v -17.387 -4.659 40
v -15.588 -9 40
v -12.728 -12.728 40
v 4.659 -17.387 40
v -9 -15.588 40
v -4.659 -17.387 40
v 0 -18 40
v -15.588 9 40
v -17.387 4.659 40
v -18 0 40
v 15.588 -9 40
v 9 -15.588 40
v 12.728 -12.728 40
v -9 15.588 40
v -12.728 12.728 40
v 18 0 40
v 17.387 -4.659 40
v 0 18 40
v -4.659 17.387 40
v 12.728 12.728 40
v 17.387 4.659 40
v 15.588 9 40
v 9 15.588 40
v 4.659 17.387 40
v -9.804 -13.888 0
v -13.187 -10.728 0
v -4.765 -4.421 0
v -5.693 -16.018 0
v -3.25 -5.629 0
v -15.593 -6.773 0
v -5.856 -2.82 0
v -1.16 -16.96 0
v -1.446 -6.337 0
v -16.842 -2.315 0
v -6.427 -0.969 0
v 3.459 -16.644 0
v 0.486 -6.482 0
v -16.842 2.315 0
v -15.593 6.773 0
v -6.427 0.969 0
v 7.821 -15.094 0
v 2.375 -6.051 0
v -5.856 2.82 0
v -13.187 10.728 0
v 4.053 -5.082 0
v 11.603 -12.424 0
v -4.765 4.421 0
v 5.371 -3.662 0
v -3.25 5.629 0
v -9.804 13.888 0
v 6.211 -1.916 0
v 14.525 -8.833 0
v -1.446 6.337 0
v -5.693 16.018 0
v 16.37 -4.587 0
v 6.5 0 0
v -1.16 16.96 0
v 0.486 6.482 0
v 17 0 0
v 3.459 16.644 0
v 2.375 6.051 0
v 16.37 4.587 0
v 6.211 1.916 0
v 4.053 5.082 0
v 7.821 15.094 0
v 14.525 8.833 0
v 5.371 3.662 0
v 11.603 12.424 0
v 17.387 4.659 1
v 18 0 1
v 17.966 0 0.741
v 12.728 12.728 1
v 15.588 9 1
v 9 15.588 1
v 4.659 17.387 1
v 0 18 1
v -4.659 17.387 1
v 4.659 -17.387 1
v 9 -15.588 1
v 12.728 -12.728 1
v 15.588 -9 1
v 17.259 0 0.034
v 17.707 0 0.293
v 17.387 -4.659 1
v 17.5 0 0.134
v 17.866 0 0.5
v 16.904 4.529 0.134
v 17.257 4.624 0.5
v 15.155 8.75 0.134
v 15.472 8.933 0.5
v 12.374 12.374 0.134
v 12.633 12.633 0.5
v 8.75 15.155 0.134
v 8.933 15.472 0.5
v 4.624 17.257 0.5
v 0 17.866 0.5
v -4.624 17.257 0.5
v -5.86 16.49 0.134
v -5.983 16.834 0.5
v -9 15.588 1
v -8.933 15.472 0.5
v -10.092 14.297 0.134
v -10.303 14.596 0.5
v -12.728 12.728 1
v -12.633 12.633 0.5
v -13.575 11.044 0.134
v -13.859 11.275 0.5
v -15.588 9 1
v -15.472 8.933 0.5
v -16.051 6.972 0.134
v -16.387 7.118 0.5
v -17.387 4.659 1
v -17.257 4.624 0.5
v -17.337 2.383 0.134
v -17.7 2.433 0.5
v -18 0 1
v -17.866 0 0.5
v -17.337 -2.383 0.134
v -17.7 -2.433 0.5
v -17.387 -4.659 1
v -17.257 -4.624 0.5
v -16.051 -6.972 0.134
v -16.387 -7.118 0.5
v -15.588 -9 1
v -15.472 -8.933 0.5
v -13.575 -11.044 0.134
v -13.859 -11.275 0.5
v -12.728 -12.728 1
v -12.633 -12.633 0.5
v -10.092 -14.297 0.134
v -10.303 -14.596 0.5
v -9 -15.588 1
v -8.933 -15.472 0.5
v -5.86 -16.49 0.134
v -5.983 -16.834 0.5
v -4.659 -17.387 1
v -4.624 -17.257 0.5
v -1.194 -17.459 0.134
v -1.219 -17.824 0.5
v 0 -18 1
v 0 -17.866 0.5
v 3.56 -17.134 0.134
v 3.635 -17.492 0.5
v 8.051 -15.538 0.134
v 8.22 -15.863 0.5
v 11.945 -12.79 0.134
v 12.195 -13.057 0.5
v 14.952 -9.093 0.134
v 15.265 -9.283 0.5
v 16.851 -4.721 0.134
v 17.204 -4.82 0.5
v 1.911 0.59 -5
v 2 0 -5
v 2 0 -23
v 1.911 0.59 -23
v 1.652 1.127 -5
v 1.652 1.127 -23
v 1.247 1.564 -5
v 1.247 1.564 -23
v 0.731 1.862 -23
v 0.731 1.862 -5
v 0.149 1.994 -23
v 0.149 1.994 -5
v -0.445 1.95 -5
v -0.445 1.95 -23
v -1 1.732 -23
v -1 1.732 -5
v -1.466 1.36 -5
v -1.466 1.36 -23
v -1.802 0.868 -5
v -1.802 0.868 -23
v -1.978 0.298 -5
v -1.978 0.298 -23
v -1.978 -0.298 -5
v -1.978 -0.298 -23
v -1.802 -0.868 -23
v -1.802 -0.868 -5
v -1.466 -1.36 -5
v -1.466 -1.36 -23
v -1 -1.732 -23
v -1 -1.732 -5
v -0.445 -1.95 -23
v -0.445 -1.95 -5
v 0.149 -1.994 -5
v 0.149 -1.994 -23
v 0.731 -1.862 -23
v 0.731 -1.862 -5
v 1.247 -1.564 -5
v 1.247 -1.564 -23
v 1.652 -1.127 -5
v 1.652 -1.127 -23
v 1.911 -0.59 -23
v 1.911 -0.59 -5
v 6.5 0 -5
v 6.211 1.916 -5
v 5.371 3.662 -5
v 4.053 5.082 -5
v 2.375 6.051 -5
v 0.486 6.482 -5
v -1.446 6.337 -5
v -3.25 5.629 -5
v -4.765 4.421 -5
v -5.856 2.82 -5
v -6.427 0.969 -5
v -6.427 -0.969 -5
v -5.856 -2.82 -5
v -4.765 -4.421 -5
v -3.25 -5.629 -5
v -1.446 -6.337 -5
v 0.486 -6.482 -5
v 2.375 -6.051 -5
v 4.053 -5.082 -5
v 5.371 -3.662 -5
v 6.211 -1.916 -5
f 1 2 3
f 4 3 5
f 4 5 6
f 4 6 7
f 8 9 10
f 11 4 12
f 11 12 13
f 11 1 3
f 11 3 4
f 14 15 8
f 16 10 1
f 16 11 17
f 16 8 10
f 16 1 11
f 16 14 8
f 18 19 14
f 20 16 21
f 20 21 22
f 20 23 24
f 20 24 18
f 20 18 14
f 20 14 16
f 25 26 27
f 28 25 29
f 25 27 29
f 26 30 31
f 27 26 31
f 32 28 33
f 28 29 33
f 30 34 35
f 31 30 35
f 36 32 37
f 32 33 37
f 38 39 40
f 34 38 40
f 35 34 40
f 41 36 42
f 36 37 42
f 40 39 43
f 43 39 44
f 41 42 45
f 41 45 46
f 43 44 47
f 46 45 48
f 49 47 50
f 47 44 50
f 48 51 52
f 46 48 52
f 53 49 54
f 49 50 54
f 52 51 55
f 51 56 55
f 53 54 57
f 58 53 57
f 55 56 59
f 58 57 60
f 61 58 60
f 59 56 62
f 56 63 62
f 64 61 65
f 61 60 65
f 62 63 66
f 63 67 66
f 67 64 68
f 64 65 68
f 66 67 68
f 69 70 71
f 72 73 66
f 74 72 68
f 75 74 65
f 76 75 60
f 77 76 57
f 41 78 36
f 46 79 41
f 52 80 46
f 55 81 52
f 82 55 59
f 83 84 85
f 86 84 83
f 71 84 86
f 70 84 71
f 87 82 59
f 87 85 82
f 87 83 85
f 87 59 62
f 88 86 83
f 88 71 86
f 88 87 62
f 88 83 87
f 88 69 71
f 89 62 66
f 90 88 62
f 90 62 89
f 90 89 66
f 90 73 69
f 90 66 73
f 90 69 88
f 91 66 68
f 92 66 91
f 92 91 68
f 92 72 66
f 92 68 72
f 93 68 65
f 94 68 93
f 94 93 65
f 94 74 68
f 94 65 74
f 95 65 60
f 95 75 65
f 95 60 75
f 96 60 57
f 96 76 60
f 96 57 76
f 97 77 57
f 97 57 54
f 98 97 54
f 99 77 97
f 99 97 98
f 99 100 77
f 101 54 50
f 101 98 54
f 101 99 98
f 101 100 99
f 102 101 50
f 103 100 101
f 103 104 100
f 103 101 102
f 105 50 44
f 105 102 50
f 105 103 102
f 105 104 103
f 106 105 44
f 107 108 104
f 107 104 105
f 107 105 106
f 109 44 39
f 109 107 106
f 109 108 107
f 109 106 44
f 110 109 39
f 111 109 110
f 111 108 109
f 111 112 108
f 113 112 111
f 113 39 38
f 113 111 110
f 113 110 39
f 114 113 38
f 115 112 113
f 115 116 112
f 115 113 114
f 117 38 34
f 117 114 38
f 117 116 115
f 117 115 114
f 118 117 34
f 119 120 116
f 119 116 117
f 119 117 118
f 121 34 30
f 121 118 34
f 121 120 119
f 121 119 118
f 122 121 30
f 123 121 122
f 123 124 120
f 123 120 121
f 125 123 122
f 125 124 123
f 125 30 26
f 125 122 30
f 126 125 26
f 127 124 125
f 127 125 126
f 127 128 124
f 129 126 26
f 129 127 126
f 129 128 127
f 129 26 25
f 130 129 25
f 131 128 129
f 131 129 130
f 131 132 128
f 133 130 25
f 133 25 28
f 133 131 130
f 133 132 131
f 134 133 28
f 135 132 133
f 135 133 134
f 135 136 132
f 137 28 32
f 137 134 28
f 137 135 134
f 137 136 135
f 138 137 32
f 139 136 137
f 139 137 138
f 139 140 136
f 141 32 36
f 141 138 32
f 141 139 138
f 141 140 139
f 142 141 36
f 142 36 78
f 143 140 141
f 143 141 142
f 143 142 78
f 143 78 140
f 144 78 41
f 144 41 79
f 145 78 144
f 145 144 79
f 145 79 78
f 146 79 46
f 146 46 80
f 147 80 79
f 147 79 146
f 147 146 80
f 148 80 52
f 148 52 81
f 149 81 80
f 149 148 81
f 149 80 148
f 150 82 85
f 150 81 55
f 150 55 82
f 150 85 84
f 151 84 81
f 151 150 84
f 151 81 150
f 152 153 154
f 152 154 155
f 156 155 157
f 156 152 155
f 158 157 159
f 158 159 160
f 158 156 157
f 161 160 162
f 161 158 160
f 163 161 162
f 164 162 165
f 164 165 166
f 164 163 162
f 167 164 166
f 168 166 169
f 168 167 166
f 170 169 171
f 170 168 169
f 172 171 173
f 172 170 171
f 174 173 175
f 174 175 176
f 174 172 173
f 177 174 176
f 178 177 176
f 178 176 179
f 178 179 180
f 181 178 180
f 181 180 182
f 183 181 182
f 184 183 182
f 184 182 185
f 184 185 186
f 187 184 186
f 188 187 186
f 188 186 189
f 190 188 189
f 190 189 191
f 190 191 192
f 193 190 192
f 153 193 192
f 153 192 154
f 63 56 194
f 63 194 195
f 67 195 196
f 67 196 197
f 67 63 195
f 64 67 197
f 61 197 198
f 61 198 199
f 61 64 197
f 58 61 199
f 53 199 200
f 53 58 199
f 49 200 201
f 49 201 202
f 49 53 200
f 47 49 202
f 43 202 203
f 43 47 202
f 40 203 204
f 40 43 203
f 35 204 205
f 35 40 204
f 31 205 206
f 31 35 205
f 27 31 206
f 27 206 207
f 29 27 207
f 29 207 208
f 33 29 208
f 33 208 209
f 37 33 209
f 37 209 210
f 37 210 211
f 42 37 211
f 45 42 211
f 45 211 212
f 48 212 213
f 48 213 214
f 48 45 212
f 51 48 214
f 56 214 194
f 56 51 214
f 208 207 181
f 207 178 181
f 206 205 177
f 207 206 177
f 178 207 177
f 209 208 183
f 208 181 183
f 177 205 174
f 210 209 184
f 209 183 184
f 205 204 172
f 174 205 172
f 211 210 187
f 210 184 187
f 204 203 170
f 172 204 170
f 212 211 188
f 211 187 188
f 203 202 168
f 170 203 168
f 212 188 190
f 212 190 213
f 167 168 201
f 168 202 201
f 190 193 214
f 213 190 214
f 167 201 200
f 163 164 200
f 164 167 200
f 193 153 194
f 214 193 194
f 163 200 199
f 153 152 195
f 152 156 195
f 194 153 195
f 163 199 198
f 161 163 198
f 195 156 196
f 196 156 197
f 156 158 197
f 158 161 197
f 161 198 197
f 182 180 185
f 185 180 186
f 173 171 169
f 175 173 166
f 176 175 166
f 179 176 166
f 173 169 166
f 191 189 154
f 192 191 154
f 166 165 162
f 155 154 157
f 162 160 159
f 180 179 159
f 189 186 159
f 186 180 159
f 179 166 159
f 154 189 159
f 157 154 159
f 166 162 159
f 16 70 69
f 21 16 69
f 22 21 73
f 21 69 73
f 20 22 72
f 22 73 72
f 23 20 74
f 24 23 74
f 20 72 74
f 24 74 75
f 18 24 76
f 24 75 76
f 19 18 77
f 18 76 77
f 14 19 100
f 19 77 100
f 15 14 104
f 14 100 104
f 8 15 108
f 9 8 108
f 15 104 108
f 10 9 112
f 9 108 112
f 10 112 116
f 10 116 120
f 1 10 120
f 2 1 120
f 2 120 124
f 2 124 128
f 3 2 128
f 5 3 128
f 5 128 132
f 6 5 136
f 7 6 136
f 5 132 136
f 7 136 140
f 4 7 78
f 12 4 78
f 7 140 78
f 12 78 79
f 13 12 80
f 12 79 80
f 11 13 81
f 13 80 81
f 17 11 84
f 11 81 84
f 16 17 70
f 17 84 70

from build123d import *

# Parameters (mm, degrees)
F0_R     = 18
F1_DEPTH = 40
F2_R     = 6.5
F3_DEPTH = 5
F4_R     = 2
F5_DEPTH = 23
F6_R     = 1


with BuildPart() as f1:
    # F0 (on Top) → F1 (new body)
    with BuildSketch(Plane.XY):
        Circle(F0_R)
    extrude(amount=F1_DEPTH)

    # F2 (on Top) → F3 (join)
    with BuildSketch(Plane.XY):
        Circle(F2_R)
    extrude(amount=-F3_DEPTH)

    # F4 (on Top) → F5 (join)
    with BuildSketch(Plane.XY):
        Circle(F4_R)
    extrude(amount=-F5_DEPTH)

    # F6
    f6_edges = [f1.edges().sort_by_distance(p)[0] for p in [
        (-18, 0, 0),
    ]]
    fillet(f6_edges, radius=F6_R)


solid = f1.part
